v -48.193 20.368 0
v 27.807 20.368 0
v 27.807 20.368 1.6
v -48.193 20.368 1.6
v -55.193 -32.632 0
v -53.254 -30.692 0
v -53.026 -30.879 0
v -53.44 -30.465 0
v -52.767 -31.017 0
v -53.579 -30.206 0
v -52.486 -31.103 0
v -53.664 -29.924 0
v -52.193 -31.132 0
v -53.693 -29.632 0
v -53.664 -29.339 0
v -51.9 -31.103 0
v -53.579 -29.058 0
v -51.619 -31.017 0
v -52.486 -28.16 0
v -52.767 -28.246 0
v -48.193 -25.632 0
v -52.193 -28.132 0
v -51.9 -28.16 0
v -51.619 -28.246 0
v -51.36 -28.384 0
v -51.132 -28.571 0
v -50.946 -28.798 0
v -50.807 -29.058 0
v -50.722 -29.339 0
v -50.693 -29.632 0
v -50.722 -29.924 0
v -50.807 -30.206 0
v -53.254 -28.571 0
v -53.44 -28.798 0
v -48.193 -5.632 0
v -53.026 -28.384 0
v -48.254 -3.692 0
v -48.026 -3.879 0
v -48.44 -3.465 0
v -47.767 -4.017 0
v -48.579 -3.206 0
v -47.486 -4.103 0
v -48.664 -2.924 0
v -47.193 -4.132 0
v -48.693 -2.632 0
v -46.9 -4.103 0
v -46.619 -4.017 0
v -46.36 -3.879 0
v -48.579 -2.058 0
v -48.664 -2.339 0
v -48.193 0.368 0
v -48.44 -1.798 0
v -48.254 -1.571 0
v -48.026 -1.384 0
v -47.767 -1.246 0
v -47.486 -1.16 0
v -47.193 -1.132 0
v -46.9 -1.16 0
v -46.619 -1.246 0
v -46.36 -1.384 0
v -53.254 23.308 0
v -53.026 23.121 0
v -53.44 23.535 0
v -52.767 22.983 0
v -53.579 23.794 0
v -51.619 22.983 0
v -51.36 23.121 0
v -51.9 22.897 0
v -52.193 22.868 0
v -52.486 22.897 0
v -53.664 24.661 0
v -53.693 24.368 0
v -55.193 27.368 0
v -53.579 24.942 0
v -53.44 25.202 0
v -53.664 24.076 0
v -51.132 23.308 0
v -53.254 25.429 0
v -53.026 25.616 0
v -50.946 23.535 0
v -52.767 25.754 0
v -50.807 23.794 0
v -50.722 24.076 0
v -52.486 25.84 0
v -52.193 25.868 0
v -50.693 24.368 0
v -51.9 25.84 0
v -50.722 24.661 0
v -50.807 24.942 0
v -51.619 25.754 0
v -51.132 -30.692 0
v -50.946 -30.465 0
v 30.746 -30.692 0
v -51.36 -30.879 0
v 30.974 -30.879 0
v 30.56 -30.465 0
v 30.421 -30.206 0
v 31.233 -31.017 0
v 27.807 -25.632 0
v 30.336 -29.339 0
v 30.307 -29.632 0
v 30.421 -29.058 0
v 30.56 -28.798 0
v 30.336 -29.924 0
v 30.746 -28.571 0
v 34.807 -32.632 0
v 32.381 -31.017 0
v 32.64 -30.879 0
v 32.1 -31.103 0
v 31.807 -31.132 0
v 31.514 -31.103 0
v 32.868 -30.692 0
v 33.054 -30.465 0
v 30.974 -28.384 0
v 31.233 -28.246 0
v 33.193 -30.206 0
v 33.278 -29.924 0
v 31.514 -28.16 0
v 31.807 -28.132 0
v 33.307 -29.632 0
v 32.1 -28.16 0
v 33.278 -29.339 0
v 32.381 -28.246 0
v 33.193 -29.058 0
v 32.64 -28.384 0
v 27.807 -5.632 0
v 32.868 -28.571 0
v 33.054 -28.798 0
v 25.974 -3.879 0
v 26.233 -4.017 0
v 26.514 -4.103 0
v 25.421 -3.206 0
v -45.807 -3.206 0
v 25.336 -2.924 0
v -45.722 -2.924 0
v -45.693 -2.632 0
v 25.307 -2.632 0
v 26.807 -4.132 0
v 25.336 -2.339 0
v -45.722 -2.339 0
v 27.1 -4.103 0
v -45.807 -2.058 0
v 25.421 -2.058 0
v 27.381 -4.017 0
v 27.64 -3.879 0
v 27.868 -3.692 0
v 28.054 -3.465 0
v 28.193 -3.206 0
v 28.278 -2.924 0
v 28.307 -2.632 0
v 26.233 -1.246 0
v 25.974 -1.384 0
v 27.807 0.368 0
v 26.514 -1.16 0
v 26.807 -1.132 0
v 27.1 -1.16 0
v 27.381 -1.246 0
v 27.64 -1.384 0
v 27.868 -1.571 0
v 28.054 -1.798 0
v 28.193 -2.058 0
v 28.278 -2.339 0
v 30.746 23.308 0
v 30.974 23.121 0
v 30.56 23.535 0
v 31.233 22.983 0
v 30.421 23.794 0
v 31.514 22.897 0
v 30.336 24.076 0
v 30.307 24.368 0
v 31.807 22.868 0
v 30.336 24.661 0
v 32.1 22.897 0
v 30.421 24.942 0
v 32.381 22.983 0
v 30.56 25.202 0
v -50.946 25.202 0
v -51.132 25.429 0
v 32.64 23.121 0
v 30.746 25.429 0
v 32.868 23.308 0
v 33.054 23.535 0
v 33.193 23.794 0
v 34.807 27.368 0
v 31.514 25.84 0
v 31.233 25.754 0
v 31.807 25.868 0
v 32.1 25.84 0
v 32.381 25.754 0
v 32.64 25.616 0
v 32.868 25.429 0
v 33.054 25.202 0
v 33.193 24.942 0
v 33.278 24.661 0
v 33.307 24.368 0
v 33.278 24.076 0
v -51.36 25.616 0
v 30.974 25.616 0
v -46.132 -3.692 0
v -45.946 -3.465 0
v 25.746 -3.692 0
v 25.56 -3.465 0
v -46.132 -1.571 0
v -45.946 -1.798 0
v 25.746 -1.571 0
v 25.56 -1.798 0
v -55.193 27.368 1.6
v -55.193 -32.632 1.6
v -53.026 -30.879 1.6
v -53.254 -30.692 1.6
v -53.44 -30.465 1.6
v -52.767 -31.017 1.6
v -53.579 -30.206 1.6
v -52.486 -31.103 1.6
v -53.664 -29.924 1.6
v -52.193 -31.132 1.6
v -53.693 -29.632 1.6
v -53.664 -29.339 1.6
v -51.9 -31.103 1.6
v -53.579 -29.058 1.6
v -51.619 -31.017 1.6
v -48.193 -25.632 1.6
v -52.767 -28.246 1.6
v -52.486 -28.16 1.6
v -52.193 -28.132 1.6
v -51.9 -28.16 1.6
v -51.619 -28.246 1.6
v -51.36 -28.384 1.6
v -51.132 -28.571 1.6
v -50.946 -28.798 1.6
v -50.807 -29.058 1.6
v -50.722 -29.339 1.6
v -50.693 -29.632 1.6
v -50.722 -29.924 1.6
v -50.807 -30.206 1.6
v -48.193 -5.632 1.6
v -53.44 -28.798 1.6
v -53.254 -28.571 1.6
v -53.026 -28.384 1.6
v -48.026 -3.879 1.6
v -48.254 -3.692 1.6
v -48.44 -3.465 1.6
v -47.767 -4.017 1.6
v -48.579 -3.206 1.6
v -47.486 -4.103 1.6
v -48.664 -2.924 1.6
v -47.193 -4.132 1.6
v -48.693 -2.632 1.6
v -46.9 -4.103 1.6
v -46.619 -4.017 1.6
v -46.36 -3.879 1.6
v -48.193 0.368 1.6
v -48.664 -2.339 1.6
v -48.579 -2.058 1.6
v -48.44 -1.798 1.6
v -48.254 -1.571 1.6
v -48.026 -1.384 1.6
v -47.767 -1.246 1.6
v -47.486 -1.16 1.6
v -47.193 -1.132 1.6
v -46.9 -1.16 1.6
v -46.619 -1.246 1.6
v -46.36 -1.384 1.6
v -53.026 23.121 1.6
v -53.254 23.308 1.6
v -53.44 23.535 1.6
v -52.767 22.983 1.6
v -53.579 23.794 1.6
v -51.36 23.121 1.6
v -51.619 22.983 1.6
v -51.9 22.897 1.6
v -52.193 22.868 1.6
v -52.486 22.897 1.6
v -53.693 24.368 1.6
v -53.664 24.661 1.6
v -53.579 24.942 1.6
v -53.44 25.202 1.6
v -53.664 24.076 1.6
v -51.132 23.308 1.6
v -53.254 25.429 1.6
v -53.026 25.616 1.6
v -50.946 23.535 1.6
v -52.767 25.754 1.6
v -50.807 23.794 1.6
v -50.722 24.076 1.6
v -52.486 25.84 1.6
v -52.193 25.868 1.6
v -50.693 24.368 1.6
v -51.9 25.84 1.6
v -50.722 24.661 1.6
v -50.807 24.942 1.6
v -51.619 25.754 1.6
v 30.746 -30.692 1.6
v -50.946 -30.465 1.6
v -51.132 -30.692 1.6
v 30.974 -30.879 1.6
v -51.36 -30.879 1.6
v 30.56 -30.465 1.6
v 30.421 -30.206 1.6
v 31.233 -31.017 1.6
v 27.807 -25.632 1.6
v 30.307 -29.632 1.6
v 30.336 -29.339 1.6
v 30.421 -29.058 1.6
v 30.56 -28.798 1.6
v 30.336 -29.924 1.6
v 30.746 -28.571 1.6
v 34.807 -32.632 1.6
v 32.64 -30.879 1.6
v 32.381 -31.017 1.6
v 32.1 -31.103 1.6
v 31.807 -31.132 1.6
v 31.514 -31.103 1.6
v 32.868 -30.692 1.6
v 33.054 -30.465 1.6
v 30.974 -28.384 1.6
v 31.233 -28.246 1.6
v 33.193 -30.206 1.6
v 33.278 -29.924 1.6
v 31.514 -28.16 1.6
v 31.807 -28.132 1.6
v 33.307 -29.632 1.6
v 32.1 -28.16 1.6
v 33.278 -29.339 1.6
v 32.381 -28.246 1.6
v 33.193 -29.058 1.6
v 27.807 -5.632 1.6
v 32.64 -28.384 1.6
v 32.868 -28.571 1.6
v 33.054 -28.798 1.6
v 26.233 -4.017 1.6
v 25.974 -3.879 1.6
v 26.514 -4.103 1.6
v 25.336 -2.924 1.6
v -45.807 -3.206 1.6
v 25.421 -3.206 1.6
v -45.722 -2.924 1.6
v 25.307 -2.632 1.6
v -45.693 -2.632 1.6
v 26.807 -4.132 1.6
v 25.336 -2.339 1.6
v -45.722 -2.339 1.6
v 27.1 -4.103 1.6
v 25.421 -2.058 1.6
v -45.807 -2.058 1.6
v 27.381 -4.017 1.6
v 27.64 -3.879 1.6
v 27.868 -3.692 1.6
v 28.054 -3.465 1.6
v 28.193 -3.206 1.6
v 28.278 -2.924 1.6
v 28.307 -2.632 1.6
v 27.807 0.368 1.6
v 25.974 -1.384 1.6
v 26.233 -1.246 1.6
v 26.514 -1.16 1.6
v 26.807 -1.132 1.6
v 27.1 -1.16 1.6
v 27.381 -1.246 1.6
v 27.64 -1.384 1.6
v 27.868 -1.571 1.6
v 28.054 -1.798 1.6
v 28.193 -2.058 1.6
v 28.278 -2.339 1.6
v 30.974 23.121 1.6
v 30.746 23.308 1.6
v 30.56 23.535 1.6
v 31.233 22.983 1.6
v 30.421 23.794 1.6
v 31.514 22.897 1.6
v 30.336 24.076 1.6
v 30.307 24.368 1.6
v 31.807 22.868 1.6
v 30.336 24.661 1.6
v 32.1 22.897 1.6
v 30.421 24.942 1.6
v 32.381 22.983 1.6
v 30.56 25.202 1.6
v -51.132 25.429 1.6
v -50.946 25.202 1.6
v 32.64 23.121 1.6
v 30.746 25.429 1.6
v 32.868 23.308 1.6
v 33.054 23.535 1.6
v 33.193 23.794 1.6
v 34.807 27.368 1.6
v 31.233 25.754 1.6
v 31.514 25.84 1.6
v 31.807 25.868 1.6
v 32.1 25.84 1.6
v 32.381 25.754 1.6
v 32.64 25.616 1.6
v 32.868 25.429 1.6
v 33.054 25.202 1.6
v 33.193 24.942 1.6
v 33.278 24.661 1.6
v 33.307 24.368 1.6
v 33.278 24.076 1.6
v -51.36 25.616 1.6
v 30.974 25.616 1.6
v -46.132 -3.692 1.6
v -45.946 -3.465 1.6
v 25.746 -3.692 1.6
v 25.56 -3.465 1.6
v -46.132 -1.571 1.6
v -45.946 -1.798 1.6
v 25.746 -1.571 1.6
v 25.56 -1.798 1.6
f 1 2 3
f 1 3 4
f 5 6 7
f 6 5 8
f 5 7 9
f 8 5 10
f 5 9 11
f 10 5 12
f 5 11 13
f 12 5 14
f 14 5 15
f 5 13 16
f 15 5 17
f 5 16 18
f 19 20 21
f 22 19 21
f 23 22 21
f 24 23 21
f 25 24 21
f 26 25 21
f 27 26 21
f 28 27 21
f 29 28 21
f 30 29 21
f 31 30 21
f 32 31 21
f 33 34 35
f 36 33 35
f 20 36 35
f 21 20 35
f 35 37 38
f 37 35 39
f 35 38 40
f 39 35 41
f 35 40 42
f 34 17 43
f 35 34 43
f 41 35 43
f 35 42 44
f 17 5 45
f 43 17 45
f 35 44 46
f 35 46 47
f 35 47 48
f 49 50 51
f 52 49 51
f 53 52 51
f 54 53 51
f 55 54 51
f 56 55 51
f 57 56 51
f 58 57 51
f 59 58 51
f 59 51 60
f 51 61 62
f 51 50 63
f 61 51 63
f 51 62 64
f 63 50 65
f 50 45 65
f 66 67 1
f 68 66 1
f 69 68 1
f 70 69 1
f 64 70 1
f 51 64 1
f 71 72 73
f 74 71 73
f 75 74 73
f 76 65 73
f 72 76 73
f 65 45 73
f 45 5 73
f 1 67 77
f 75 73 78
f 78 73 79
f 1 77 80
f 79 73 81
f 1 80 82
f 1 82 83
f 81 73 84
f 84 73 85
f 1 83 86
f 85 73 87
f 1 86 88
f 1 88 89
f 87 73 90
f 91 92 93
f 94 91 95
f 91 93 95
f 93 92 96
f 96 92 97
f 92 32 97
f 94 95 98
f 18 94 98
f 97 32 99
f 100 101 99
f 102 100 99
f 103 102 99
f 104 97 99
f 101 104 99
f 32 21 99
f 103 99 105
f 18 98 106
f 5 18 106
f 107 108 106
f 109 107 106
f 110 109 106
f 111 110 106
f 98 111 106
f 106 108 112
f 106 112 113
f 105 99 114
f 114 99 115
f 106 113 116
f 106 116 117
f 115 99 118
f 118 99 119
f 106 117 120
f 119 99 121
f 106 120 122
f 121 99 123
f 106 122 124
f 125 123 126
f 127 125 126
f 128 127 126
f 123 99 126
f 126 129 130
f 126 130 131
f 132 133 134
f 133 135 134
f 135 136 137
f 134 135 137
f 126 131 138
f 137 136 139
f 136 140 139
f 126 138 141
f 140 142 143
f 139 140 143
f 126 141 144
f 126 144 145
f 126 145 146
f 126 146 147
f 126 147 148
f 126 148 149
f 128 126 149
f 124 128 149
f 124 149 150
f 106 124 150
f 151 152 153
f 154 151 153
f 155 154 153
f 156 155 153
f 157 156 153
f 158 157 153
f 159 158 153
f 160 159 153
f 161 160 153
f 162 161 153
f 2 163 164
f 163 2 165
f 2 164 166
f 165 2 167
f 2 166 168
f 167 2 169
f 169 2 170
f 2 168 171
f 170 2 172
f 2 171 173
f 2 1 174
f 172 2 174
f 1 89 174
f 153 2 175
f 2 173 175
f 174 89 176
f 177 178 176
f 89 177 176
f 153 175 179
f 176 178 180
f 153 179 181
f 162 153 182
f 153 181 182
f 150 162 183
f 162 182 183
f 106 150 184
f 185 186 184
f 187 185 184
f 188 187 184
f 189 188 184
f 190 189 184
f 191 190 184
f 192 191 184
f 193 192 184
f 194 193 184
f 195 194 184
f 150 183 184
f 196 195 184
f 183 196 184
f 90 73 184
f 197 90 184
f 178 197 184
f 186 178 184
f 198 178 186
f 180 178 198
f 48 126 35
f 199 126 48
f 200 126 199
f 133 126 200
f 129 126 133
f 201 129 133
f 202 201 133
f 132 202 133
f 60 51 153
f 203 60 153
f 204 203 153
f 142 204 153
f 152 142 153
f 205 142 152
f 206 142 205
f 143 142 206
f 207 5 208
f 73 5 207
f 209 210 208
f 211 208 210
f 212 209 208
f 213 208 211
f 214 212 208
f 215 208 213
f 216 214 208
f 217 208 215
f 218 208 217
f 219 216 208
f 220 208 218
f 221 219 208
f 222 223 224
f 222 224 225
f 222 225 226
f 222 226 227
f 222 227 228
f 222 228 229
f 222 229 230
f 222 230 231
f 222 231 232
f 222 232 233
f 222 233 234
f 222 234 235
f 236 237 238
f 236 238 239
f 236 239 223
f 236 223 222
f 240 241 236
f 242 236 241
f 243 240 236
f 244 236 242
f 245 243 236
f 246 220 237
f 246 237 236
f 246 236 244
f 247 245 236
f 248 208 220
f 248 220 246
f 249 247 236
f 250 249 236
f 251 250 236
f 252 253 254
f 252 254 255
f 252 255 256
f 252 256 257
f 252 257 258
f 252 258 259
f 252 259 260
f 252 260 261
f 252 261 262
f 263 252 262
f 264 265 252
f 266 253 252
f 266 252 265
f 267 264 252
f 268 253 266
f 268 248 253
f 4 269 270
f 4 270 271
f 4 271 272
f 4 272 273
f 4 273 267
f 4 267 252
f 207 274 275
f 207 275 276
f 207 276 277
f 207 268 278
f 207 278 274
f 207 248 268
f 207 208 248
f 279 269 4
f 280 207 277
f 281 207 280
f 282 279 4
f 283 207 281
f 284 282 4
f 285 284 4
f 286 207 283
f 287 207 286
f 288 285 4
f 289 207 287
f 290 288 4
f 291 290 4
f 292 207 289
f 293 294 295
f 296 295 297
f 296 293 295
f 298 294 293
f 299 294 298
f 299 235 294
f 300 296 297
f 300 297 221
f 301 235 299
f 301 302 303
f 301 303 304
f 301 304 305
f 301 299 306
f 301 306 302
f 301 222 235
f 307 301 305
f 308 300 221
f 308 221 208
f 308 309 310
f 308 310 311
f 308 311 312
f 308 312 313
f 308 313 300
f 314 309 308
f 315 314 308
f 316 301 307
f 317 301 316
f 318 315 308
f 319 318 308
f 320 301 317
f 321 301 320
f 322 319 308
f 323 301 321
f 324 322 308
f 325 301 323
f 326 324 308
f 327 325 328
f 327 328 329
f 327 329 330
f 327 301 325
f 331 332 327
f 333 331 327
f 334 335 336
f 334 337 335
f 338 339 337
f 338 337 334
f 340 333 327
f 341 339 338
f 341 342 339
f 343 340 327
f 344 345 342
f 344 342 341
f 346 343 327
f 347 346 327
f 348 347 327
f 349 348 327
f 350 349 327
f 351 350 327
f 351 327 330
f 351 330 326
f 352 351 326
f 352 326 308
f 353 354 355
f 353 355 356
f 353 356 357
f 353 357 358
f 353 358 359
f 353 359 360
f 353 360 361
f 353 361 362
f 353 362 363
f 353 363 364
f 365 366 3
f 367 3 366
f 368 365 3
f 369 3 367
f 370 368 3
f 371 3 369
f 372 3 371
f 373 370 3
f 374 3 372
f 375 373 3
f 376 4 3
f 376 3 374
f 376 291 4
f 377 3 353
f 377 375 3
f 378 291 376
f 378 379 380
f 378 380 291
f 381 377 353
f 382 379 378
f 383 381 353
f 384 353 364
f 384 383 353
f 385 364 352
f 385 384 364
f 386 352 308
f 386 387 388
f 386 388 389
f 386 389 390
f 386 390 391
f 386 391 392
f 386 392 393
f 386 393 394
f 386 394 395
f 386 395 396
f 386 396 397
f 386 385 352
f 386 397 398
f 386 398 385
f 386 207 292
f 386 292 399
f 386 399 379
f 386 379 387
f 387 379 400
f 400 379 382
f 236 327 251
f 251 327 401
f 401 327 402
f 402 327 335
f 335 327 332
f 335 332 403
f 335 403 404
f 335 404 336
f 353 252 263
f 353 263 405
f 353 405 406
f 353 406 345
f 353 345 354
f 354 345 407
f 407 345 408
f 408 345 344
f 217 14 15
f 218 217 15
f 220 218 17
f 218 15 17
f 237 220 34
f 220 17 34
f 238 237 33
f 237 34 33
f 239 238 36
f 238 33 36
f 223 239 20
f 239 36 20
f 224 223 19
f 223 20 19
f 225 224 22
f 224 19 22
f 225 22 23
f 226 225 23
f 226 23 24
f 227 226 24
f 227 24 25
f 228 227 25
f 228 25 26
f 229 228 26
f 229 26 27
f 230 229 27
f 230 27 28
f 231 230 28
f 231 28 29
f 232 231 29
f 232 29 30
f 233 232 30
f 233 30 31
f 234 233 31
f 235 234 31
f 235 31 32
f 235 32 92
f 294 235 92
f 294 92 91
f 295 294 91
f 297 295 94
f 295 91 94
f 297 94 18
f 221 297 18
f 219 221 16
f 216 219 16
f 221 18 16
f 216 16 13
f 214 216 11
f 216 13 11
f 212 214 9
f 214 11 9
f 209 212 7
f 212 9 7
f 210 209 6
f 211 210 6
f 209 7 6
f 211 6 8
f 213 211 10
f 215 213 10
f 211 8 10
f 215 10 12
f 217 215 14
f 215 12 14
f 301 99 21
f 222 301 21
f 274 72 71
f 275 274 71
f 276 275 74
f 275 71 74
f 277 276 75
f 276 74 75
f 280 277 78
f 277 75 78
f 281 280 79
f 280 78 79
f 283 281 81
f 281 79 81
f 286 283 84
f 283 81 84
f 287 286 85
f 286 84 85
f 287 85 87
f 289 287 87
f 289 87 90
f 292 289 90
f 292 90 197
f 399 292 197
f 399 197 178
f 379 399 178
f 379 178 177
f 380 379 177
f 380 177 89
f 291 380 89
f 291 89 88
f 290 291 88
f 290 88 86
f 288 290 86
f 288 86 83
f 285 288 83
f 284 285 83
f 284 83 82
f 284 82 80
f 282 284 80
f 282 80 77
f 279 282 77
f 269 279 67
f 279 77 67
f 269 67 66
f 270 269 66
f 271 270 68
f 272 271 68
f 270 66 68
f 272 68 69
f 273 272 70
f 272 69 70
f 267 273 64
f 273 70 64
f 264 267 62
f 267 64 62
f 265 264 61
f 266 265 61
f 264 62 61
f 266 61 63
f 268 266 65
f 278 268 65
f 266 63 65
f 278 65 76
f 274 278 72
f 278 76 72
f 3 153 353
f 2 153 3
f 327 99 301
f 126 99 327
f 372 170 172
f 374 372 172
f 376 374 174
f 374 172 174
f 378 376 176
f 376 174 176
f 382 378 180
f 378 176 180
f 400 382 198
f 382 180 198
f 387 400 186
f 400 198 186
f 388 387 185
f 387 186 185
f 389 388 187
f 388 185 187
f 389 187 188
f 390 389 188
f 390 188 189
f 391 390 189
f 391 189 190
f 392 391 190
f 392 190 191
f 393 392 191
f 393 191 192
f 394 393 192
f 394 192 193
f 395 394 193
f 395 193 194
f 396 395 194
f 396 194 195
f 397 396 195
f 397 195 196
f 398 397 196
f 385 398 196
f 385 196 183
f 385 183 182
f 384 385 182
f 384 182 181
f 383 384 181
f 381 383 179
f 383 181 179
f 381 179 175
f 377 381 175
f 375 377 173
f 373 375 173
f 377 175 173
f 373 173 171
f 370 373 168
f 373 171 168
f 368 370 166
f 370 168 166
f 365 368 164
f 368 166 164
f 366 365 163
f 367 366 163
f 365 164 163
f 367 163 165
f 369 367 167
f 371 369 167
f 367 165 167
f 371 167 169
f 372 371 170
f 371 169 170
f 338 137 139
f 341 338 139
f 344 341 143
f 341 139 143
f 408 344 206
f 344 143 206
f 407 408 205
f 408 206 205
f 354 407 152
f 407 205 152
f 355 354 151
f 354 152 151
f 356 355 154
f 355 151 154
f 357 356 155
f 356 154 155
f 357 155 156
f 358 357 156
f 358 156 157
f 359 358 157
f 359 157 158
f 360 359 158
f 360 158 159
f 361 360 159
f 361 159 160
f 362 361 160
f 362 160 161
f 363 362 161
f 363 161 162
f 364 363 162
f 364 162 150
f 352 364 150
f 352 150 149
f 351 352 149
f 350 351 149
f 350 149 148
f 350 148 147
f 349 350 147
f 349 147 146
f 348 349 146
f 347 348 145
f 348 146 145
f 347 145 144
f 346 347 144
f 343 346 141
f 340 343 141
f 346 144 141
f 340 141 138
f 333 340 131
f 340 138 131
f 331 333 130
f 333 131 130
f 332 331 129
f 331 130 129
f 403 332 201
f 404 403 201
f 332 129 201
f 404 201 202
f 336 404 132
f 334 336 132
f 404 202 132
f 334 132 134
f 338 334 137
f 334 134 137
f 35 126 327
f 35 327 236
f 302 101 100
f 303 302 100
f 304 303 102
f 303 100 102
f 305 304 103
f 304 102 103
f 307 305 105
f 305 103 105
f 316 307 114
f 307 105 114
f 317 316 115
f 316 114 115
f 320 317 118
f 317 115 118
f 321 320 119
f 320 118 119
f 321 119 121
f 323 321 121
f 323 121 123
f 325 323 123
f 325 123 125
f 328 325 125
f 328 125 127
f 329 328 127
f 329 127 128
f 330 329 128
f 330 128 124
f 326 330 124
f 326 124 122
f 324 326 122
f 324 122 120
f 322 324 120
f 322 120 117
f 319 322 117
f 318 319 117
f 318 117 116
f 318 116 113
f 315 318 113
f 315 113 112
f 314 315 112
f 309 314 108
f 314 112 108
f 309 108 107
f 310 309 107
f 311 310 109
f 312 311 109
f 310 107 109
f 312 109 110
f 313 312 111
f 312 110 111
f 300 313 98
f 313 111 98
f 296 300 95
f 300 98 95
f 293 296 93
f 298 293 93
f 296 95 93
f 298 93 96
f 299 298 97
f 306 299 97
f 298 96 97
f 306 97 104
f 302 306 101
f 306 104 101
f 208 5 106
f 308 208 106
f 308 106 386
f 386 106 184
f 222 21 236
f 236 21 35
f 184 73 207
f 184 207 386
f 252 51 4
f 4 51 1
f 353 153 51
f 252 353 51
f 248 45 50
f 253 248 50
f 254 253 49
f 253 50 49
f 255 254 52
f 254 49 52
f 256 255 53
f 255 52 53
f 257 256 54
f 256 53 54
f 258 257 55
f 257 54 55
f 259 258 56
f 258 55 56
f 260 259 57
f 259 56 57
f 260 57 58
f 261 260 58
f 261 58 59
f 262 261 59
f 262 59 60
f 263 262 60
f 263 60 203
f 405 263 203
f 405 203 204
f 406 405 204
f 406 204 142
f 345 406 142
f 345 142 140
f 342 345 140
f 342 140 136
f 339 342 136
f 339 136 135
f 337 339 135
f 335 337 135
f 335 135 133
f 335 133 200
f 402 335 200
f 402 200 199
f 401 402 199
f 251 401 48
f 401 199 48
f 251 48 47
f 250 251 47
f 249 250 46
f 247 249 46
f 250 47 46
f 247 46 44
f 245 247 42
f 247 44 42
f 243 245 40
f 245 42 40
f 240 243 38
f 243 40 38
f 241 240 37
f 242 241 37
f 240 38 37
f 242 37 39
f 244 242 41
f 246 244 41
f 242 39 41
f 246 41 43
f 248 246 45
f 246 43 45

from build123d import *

# Parameters (mm, degrees)
SKETCH_2_W          = 90
SKETCH_2_H          = 60
EXTRUDE_1_DEPTH     = 1.6
SKETCH_3_R          = 1.5
SKETCH_3_W          = 76
SKETCH_3_H          = 20
CUT_EXTRUDE_1_DEPTH = 2.6


with BuildPart() as part:
    # ｽｹｯﾁ2 → ﾎﾞｽ - 押し出し1 (new body)
    with BuildSketch(Plane.XY):
        with Locations((-10.192982456, -2.631578947)):
            Rectangle(SKETCH_2_W, SKETCH_2_H)
    extrude(amount=EXTRUDE_1_DEPTH)

    # ｽｹｯﾁ3 → ｶｯﾄ - 押し出し1 (cut, through all)
    with BuildSketch(Plane(origin=(0, 0, 0), x_dir=(-1, 0, 0), z_dir=(0, 0, -1))):
        with Locations((47.192982456, -2.631578947)):
            Circle(SKETCH_3_R)
        with Locations((-26.807017544, -2.631578947)):
            Circle(SKETCH_3_R)
        with Locations((52.192982456, 24.368421053)):
            Circle(SKETCH_3_R)
        with Locations((-31.807017544, 24.368421053)):
            Circle(SKETCH_3_R)
        with Locations((-31.807017544, -29.631578947)):
            Circle(SKETCH_3_R)
        with Locations((52.192982456, -29.631578947)):
            Circle(SKETCH_3_R)
        with Locations((10.192982456, 10.368421053)):
            Rectangle(SKETCH_3_W, SKETCH_3_H)
        with Locations((10.192982456, -15.631578947)):
            Rectangle(SKETCH_3_W, SKETCH_3_H)
    extrude(amount=-CUT_EXTRUDE_1_DEPTH, mode=Mode.SUBTRACT)


solid = part.part
